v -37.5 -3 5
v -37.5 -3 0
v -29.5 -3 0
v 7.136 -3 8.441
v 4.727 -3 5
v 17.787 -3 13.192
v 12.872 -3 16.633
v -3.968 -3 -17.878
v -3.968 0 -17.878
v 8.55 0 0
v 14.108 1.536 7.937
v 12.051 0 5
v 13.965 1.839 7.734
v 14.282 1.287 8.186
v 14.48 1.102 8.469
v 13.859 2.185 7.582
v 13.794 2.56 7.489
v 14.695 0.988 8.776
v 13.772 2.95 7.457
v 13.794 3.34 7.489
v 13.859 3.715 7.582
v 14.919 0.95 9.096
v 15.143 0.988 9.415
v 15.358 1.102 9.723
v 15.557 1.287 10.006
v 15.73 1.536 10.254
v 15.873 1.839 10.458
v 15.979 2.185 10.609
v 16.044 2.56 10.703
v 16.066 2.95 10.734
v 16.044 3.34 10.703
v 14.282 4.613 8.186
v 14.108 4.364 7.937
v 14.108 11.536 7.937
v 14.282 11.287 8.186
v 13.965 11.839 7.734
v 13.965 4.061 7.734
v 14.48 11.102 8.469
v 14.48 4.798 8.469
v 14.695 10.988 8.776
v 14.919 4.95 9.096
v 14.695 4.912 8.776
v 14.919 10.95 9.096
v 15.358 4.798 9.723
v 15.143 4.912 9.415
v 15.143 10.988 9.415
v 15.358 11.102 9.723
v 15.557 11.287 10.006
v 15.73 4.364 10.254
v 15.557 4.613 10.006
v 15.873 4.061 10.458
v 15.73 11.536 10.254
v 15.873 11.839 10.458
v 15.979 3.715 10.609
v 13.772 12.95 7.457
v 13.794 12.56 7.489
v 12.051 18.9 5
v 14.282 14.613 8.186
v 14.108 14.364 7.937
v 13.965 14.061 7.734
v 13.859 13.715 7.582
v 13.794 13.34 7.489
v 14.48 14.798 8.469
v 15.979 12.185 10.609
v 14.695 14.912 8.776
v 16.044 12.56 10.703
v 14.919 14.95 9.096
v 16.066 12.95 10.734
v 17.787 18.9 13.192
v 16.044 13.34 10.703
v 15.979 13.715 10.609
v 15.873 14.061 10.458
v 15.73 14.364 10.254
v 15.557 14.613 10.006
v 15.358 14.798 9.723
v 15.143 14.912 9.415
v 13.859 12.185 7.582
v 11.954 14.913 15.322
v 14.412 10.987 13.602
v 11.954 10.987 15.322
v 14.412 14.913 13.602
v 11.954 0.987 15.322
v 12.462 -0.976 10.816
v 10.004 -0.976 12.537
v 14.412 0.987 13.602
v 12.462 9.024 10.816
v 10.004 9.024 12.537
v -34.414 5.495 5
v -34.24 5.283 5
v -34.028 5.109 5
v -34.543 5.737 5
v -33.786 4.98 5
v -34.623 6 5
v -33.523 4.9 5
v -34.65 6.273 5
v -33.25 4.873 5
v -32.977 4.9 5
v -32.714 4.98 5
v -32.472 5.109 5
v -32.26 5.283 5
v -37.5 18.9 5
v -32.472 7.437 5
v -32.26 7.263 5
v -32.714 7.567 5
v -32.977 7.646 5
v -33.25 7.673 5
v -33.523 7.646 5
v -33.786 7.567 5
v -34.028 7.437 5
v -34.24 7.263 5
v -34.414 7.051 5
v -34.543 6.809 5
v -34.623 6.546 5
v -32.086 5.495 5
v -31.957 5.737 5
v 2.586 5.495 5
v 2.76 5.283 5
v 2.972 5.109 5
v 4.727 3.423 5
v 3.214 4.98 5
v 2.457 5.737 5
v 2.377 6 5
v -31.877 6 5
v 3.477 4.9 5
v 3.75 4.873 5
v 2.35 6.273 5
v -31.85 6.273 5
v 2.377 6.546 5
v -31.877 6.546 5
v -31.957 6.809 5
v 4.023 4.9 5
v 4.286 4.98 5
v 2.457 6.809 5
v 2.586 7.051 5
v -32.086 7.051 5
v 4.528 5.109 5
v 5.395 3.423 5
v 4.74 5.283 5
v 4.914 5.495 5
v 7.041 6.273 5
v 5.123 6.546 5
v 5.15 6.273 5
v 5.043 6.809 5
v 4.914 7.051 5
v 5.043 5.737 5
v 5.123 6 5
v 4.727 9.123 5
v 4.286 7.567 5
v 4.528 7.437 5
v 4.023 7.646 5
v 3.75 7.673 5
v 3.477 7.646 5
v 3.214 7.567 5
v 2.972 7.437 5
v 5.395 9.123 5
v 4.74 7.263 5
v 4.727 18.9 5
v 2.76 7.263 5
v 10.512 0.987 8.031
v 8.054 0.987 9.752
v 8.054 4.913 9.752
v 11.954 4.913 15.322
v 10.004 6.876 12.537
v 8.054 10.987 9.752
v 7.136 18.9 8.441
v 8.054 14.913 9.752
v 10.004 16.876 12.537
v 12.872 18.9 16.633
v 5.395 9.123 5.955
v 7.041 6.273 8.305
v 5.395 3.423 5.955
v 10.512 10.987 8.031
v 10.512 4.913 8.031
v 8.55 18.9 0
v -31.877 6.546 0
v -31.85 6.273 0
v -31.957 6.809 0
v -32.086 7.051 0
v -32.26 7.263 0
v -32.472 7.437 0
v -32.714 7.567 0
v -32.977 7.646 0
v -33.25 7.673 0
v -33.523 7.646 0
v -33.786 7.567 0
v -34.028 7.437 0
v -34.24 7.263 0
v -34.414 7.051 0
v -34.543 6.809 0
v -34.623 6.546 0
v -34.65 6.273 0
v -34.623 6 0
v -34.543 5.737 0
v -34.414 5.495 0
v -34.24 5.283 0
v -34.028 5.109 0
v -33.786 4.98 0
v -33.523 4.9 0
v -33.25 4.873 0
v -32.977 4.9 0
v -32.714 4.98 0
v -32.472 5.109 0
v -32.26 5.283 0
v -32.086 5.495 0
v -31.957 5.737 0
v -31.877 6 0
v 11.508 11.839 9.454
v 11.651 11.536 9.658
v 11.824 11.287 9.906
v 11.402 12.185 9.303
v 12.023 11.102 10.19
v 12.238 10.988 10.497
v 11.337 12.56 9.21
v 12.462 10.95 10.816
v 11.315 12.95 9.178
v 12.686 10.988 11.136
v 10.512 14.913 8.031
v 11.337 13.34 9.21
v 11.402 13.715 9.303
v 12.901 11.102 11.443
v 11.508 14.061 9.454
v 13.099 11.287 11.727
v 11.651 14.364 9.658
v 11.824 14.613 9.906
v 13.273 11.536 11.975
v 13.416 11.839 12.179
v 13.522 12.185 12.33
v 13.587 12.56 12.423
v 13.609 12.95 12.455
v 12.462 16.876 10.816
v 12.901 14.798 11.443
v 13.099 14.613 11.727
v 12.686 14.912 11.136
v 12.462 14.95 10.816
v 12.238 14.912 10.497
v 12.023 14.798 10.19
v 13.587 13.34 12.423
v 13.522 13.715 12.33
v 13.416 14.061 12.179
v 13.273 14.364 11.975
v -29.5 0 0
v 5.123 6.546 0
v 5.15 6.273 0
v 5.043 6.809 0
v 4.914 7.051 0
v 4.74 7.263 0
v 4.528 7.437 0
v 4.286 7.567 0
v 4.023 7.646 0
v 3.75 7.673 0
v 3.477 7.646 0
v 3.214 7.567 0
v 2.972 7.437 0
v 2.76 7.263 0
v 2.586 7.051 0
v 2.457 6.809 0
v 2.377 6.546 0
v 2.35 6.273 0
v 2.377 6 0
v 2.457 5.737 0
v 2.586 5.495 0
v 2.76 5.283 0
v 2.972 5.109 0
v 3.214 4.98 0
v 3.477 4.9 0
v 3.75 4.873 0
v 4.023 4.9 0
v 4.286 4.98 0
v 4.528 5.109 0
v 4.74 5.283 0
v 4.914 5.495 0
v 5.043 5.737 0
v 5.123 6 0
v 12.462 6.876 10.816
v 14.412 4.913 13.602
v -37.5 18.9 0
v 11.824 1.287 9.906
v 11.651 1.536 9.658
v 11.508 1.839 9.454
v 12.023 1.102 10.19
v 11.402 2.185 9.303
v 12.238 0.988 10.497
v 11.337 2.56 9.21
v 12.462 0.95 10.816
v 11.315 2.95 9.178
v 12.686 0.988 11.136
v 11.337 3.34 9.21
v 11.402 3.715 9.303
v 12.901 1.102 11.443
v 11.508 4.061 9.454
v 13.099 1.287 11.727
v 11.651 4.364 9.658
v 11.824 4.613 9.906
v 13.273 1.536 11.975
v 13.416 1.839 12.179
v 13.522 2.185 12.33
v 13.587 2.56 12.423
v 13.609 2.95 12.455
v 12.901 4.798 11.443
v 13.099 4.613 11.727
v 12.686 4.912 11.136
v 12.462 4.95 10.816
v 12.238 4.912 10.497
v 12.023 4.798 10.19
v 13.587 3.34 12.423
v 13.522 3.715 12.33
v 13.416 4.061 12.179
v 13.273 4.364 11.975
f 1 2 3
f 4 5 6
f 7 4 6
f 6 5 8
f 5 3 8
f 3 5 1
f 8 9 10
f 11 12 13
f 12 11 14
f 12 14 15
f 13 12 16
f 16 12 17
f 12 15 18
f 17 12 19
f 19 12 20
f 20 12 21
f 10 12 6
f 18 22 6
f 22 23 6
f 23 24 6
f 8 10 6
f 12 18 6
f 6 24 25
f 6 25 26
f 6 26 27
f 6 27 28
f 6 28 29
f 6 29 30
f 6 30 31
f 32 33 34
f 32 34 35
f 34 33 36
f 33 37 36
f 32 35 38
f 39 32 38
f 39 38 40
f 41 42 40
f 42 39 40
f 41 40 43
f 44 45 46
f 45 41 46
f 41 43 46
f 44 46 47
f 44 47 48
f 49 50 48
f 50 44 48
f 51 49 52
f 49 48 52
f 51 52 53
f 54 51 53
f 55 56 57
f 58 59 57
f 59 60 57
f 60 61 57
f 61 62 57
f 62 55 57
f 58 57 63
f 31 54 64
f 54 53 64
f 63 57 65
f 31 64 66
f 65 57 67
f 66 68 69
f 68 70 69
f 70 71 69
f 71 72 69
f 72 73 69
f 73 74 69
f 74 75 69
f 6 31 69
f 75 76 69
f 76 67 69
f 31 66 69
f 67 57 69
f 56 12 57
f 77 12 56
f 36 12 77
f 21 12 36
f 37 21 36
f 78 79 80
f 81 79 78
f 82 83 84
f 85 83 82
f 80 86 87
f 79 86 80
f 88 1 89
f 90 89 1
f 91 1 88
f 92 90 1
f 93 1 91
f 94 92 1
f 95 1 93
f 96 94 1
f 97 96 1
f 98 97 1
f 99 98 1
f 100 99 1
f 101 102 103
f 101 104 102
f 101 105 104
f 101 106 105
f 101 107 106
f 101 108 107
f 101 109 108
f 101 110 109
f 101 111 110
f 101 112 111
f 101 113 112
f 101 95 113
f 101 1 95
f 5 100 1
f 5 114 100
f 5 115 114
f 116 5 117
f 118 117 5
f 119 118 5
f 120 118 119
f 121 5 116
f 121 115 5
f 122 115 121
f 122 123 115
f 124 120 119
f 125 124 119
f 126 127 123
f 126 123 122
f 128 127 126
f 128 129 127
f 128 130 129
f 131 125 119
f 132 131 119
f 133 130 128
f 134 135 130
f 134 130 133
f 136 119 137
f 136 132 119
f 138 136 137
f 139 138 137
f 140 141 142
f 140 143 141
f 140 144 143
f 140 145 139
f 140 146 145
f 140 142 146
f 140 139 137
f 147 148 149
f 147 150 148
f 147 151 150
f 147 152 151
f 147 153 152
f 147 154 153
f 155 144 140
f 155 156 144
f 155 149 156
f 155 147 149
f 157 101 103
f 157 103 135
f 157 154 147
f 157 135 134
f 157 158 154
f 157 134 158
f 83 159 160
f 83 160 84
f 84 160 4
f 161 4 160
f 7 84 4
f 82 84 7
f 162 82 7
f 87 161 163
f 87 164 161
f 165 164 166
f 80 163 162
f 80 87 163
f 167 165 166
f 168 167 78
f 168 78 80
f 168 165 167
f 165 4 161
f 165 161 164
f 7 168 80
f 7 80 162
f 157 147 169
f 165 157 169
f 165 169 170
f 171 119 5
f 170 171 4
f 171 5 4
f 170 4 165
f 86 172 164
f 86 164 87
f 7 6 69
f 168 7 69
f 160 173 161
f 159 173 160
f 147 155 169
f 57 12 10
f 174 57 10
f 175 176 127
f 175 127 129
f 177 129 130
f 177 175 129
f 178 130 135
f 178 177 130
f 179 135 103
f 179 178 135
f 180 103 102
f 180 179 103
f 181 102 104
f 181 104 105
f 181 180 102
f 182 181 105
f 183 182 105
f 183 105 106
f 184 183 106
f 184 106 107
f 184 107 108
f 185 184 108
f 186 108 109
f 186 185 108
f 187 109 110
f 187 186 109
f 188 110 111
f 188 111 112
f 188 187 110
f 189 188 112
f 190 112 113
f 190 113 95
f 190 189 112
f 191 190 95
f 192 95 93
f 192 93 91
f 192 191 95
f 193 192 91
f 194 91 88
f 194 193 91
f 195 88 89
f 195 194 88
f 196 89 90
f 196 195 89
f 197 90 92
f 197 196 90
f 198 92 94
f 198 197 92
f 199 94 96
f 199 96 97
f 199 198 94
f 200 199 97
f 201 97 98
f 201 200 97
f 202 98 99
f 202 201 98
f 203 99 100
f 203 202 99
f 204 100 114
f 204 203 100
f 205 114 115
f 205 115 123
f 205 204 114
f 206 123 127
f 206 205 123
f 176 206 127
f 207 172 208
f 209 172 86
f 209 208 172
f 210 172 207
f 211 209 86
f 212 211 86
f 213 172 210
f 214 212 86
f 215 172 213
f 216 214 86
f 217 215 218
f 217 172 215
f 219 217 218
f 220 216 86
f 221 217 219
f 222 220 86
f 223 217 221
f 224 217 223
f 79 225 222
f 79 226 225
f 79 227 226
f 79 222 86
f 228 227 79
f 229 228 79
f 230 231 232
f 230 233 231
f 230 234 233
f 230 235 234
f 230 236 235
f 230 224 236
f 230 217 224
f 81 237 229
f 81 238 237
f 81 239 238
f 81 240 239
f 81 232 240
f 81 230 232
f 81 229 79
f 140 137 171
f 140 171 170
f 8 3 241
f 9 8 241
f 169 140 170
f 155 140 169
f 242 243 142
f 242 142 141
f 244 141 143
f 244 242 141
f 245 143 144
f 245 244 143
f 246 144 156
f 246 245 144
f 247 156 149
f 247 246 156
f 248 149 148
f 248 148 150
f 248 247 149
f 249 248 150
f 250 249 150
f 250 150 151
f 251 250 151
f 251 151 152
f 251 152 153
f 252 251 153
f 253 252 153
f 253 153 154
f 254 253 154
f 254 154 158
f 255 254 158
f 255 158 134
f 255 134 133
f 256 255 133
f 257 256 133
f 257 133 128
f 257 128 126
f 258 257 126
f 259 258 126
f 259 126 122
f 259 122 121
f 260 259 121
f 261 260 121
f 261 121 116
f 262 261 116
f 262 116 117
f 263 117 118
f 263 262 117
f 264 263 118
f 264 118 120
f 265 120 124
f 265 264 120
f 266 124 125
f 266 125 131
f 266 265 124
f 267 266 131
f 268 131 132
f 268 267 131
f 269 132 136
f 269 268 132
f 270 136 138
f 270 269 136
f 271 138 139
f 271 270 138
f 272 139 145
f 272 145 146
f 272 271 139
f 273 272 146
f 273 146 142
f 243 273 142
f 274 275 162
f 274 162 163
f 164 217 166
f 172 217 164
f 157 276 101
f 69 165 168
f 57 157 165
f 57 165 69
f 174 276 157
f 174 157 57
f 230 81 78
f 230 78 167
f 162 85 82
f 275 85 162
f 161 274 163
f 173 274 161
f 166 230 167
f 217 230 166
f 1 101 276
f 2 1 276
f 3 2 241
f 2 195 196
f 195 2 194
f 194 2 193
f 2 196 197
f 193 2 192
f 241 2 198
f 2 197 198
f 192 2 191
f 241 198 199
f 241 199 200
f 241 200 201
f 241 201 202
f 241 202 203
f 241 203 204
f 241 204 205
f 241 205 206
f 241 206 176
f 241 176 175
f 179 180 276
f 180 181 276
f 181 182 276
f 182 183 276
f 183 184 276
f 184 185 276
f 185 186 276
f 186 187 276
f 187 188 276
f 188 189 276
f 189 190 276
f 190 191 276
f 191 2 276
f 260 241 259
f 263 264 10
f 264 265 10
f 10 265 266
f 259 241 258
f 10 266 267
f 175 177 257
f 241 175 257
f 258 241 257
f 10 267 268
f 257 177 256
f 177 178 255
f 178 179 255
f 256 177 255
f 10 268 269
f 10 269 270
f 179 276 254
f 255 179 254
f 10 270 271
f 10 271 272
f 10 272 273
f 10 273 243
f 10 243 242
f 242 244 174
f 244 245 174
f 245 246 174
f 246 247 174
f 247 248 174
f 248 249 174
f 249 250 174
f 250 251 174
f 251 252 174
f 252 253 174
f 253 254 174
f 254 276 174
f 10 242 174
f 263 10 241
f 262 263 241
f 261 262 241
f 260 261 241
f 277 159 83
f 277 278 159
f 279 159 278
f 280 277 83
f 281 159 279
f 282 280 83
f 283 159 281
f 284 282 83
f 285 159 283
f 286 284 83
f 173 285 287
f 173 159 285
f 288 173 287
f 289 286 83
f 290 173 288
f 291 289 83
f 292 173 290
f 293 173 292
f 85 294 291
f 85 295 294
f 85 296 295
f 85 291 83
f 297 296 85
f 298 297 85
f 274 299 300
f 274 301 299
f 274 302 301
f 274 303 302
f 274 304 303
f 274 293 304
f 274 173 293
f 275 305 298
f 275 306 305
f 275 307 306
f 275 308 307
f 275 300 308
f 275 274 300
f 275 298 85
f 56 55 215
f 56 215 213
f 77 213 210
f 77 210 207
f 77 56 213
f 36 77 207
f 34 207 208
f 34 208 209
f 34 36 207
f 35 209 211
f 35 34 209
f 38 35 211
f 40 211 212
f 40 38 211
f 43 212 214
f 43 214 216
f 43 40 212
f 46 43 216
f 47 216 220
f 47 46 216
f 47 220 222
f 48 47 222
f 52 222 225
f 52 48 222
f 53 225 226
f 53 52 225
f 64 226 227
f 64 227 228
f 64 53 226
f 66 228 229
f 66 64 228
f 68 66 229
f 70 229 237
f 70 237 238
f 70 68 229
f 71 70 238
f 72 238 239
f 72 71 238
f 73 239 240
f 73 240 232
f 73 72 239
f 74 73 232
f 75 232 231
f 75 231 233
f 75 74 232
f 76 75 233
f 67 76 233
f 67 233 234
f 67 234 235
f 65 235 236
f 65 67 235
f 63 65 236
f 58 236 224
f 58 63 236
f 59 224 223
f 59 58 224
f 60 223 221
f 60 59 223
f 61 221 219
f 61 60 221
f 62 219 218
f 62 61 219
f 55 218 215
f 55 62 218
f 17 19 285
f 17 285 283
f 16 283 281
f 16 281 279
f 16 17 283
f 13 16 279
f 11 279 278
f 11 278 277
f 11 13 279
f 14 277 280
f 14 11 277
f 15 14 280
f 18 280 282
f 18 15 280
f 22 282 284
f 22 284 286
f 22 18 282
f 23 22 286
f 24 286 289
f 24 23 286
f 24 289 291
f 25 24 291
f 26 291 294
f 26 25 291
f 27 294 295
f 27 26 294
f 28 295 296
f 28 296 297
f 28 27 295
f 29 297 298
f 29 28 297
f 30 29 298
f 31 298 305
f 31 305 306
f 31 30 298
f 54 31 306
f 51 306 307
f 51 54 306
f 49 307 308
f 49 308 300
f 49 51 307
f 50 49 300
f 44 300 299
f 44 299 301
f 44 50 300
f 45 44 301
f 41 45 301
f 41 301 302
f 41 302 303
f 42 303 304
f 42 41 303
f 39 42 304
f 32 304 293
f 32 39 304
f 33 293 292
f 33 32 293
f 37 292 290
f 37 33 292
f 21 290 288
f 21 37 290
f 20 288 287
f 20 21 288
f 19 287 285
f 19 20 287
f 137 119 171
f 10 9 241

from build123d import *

# Parameters (mm, degrees)
SKETCH1_R            = 1.4
BOSS_EXTRUDE1_DEPTH  = 5
BOSS_EXTRUDE9_DEPTH  = 18.9
SKETCH1_4_R          = 1.4
CUT_EXTRUDE4_DEPTH   = 5
BOSS_EXTRUDE10_REACH = 49.608
SKETCH5_W            = 27.928634905
SKETCH5_H            = 3
SKETCH8_W            = 10
SKETCH8_H            = 21.9
SKETCH8_R            = 2
BOSS_EXTRUDE11_DEPTH = 3
SKETCH8_3_W          = 10
SKETCH8_3_H          = 21.9
BOSS_EXTRUDE12_DEPTH = 6
BOSS_EXTRUDE13_START = -3
BOSS_EXTRUDE13_DEPTH = 21.9
CUT_EXTRUDE5_DEPTH   = 6
BOSS_EXTRUDE14_DEPTH = 5
SKETCH11_2_W         = 8
SKETCH11_2_H         = 5
BOSS_EXTRUDE15_DEPTH = 3
SKETCH12_W           = 8
SKETCH12_H           = 5
CUT_EXTRUDE6_DEPTH   = 18.6


# Read off the part's stored shape, not the designer's step: Boss-Extrude9, Boss-Extrude13, Boss-Extrude14
with BuildPart() as part:
    # Sketch1 → Boss-Extrude1 (new body)
    with BuildSketch(Plane.XY):
        with BuildLine():
            Line((3.38, 2.541421507), (0, 2.523123532))
            Line((0, 2.523123532), (0, 0))
            Line((0, 0), (-29.5, 0))
            Line((-29.5, 0), (-29.5, 2.523123532))
            Line((-29.5, 2.523123532), (-32.88, 2.523123532))
            ThreePointArc((-32.88, 2.523123532), (-37.018209124, 6.273123532), (-32.88, 10.023123532))
            Line((-32.88, 10.023123532), (-29.5, 10.023123532))
            Line((-29.5, 10.023123532), (-29.5, 18.9))
            Line((-29.5, 18.9), (0, 18.9))
            Line((0, 18.9), (0, 10.023123532))
            Line((0, 10.023123532), (3.75, 10.023123532))
            ThreePointArc((3.75, 10.023123532), (7.495422713, 6.087897443), (3.38, 2.541421507))
        make_face()
        with Locations((3.75, 6.273123532)):
            Circle(SKETCH1_R, mode=Mode.SUBTRACT)
        with Locations((-33.25, 6.273123532)):
            Circle(SKETCH1_R, mode=Mode.SUBTRACT)
    extrude(amount=BOSS_EXTRUDE1_DEPTH)

    # Boss-Extrude9 outline → Boss-Extrude9 (add)
    with BuildSketch(Plane(origin=(0, 0, 0), x_dir=(1, 0, 0), z_dir=(0, 1, 0))):
        Polygon((0, -5), (12.051348998, -5), (8.550311307, 0), (0, 0), align=None)
    extrude(amount=BOSS_EXTRUDE9_DEPTH)

    # Sketch1<4> → Cut-Extrude4 (cut)
    with BuildSketch(Plane.XY):
        with Locations((3.75, 6.273123532)):
            Circle(SKETCH1_4_R)
    extrude(amount=CUT_EXTRUDE4_DEPTH, mode=Mode.SUBTRACT)

    # Boss-Extrude10: up to this face of the body (flat: up to its plane)
    boss_extrude10_end = Plane(part.part.faces().sort_by_distance((-10.115754309, 9.30291887, 5))[0])
    # Sketch5 → Boss-Extrude10 (add, up to the picked face)
    with BuildSketch(Plane(origin=(5.737345003, 0, -4.01733222), x_dir=(0.5735764363510504, 0, 0.8191520442889888), z_dir=(-0.8191520442889888, 0, 0.5735764363510504)), mode=Mode.PRIVATE) as boss_extrude10_sk1:
        with Locations((-2.95618742, -1.5)):
            Rectangle(SKETCH5_W, SKETCH5_H)
    boss_extrude10_tool1 = split(extrude(boss_extrude10_sk1.sketch, amount=BOSS_EXTRUDE10_REACH, mode=Mode.PRIVATE), bisect_by=boss_extrude10_end, keep=Keep.BOTH, mode=Mode.PRIVATE)
    add(boss_extrude10_tool1.solids().sort_by(Axis((4.041746, -1.5, -6.438899), (-0.8191520442889888, 0, 0.5735764363510504)))[0])



with BuildPart() as body_2:
    # Sketch8 → Boss-Extrude11 (new body)
    # profile 1 of 3: a face of its own
    with BuildSketch(Plane(origin=(5.737345003, 0, -4.01733222), x_dir=(0.5735764363510504, 0, 0.8191520442889888), z_dir=(-0.8191520442889888, 0, 0.5735764363510504))):
        with Locations((16.008130033, 7.95)):
            Rectangle(SKETCH8_W, SKETCH8_H)
        Polygon((19.408130033, 14.912990915), (16.008130033, 16.87598183), (12.608130033, 14.912990915), (12.608130033, 10.987009085), (16.008130033, 9.02401817), (19.408130033, 10.987009085), align=None, mode=Mode.SUBTRACT)
        Polygon((16.008130033, 6.87598183), (12.608130033, 4.912990915), (12.608130033, 0.987009085), (16.008130033, -0.97598183), (19.408130033, 0.987009085), (19.408130033, 4.912990915), align=None, mode=Mode.SUBTRACT)
    # profile 2 of 3: a face of its own
    with BuildSketch(Plane(origin=(5.737345003, 0, -4.01733222), x_dir=(0.5735764363510504, 0, 0.8191520442889888), z_dir=(-0.8191520442889888, 0, 0.5735764363510504))):
        Polygon((19.408130033, 4.912990915), (16.008130033, 6.87598183), (12.608130033, 4.912990915), (12.608130033, 0.987009085), (16.008130033, -0.97598183), (19.408130033, 0.987009085), align=None)
        with Locations(Location((16.008130033, 2.95, 0), (0, 0, 180))):
            Circle(SKETCH8_R, mode=Mode.SUBTRACT)
    # profile 3 of 3: a face of its own
    with BuildSketch(Plane(origin=(5.737345003, 0, -4.01733222), x_dir=(0.5735764363510504, 0, 0.8191520442889888), z_dir=(-0.8191520442889888, 0, 0.5735764363510504))):
        Polygon((19.408130033, 10.987009085), (19.408130033, 14.912990915), (16.008130033, 16.87598183), (12.608130033, 14.912990915), (12.608130033, 10.987009085), (16.008130033, 9.02401817), align=None)
        with Locations(Location((16.008130033, 12.95, 0), (0, 0, 180))):
            Circle(SKETCH8_R, mode=Mode.SUBTRACT)
    extrude(amount=BOSS_EXTRUDE11_DEPTH)

    # Sketch8<3> → Boss-Extrude12 (add)
    with BuildSketch(Plane(origin=(5.737345003, 0, -4.01733222), x_dir=(0.5735764363510504, 0, 0.8191520442889888), z_dir=(-0.8191520442889888, 0, 0.5735764363510504))):
        with Locations((16.008130033, 7.95)):
            Rectangle(SKETCH8_3_W, SKETCH8_3_H)
        Polygon((19.408130033, 14.912990915), (16.008130033, 16.87598183), (12.608130033, 14.912990915), (12.608130033, 10.987009085), (16.008130033, 9.02401817), (19.408130033, 10.987009085), align=None, mode=Mode.SUBTRACT)
        Polygon((16.008130033, 6.87598183), (12.608130033, 4.912990915), (12.608130033, 0.987009085), (16.008130033, -0.97598183), (19.408130033, 0.987009085), (19.408130033, 4.912990915), align=None, mode=Mode.SUBTRACT)
    extrude(amount=BOSS_EXTRUDE12_DEPTH)


with BuildPart() as part_1:
    add(part.part)

    add(body_2.part)  # Boss-Extrude13 merges body 2
    # Boss-Extrude13 outline → Boss-Extrude13 (add)
    with BuildSketch(Plane(origin=(0, 0, 0), x_dir=(1, 0, 0), z_dir=(0, 1, 0)).offset(BOSS_EXTRUDE13_START)):
        Polygon((12.051348998, -5), (4.726701466, -5), (7.136436733, -8.441458618), align=None)
    extrude(amount=BOSS_EXTRUDE13_DEPTH)

    # Sketch10 → Cut-Extrude5 (cut)
    with BuildSketch(Plane.XY.offset(5)):
        Polygon((2.104551733, 9.123123532), (0.459103466, 6.273123532), (2.104551733, 3.423123532), (5.395448267, 3.423123532), (7.040896534, 6.273123532), (5.395448267, 9.123123532), align=None)
    extrude(amount=CUT_EXTRUDE5_DEPTH, mode=Mode.SUBTRACT)

    # Boss-Extrude14 outline → Boss-Extrude14 (add)
    with BuildSketch(Plane.XY):
        with BuildLine():
            Line((-29.5, 10.023123532), (-29.5, 37.5))
            Line((-29.5, 37.5), (-37.5, 37.5))
            Line((-37.5, 37.5), (-37.5, 0))
            Line((-37.5, 0), (-29.5, 0))
            Line((-29.5, 0), (-29.5, 2.523123532))
            Line((-29.5, 2.523123532), (-32.88, 2.523123532))
            ThreePointArc((-32.88, 2.523123532), (-37.018209124, 6.273123532), (-32.88, 10.023123532))
            Line((-32.88, 10.023123532), (-29.5, 10.023123532))
        make_face()
    extrude(amount=BOSS_EXTRUDE14_DEPTH)

    # Sketch11<2> → Boss-Extrude15 (add)
    with BuildSketch(Plane(origin=(0, 0, 0), x_dir=(1, 0, 0), z_dir=(0, 1, 0))):
        with Locations((-33.5, -2.5)):
            Rectangle(SKETCH11_2_W, SKETCH11_2_H)
    extrude(amount=-BOSS_EXTRUDE15_DEPTH)

    # Sketch12 → Cut-Extrude6 (cut)
    with BuildSketch(Plane(origin=(0, 37.5, 0), x_dir=(1, 0, 0), z_dir=(0, 1, 0))):
        with Locations((-33.5, -2.5)):
            Rectangle(SKETCH12_W, SKETCH12_H)
    extrude(amount=-CUT_EXTRUDE6_DEPTH, mode=Mode.SUBTRACT)


solid = part_1.part
